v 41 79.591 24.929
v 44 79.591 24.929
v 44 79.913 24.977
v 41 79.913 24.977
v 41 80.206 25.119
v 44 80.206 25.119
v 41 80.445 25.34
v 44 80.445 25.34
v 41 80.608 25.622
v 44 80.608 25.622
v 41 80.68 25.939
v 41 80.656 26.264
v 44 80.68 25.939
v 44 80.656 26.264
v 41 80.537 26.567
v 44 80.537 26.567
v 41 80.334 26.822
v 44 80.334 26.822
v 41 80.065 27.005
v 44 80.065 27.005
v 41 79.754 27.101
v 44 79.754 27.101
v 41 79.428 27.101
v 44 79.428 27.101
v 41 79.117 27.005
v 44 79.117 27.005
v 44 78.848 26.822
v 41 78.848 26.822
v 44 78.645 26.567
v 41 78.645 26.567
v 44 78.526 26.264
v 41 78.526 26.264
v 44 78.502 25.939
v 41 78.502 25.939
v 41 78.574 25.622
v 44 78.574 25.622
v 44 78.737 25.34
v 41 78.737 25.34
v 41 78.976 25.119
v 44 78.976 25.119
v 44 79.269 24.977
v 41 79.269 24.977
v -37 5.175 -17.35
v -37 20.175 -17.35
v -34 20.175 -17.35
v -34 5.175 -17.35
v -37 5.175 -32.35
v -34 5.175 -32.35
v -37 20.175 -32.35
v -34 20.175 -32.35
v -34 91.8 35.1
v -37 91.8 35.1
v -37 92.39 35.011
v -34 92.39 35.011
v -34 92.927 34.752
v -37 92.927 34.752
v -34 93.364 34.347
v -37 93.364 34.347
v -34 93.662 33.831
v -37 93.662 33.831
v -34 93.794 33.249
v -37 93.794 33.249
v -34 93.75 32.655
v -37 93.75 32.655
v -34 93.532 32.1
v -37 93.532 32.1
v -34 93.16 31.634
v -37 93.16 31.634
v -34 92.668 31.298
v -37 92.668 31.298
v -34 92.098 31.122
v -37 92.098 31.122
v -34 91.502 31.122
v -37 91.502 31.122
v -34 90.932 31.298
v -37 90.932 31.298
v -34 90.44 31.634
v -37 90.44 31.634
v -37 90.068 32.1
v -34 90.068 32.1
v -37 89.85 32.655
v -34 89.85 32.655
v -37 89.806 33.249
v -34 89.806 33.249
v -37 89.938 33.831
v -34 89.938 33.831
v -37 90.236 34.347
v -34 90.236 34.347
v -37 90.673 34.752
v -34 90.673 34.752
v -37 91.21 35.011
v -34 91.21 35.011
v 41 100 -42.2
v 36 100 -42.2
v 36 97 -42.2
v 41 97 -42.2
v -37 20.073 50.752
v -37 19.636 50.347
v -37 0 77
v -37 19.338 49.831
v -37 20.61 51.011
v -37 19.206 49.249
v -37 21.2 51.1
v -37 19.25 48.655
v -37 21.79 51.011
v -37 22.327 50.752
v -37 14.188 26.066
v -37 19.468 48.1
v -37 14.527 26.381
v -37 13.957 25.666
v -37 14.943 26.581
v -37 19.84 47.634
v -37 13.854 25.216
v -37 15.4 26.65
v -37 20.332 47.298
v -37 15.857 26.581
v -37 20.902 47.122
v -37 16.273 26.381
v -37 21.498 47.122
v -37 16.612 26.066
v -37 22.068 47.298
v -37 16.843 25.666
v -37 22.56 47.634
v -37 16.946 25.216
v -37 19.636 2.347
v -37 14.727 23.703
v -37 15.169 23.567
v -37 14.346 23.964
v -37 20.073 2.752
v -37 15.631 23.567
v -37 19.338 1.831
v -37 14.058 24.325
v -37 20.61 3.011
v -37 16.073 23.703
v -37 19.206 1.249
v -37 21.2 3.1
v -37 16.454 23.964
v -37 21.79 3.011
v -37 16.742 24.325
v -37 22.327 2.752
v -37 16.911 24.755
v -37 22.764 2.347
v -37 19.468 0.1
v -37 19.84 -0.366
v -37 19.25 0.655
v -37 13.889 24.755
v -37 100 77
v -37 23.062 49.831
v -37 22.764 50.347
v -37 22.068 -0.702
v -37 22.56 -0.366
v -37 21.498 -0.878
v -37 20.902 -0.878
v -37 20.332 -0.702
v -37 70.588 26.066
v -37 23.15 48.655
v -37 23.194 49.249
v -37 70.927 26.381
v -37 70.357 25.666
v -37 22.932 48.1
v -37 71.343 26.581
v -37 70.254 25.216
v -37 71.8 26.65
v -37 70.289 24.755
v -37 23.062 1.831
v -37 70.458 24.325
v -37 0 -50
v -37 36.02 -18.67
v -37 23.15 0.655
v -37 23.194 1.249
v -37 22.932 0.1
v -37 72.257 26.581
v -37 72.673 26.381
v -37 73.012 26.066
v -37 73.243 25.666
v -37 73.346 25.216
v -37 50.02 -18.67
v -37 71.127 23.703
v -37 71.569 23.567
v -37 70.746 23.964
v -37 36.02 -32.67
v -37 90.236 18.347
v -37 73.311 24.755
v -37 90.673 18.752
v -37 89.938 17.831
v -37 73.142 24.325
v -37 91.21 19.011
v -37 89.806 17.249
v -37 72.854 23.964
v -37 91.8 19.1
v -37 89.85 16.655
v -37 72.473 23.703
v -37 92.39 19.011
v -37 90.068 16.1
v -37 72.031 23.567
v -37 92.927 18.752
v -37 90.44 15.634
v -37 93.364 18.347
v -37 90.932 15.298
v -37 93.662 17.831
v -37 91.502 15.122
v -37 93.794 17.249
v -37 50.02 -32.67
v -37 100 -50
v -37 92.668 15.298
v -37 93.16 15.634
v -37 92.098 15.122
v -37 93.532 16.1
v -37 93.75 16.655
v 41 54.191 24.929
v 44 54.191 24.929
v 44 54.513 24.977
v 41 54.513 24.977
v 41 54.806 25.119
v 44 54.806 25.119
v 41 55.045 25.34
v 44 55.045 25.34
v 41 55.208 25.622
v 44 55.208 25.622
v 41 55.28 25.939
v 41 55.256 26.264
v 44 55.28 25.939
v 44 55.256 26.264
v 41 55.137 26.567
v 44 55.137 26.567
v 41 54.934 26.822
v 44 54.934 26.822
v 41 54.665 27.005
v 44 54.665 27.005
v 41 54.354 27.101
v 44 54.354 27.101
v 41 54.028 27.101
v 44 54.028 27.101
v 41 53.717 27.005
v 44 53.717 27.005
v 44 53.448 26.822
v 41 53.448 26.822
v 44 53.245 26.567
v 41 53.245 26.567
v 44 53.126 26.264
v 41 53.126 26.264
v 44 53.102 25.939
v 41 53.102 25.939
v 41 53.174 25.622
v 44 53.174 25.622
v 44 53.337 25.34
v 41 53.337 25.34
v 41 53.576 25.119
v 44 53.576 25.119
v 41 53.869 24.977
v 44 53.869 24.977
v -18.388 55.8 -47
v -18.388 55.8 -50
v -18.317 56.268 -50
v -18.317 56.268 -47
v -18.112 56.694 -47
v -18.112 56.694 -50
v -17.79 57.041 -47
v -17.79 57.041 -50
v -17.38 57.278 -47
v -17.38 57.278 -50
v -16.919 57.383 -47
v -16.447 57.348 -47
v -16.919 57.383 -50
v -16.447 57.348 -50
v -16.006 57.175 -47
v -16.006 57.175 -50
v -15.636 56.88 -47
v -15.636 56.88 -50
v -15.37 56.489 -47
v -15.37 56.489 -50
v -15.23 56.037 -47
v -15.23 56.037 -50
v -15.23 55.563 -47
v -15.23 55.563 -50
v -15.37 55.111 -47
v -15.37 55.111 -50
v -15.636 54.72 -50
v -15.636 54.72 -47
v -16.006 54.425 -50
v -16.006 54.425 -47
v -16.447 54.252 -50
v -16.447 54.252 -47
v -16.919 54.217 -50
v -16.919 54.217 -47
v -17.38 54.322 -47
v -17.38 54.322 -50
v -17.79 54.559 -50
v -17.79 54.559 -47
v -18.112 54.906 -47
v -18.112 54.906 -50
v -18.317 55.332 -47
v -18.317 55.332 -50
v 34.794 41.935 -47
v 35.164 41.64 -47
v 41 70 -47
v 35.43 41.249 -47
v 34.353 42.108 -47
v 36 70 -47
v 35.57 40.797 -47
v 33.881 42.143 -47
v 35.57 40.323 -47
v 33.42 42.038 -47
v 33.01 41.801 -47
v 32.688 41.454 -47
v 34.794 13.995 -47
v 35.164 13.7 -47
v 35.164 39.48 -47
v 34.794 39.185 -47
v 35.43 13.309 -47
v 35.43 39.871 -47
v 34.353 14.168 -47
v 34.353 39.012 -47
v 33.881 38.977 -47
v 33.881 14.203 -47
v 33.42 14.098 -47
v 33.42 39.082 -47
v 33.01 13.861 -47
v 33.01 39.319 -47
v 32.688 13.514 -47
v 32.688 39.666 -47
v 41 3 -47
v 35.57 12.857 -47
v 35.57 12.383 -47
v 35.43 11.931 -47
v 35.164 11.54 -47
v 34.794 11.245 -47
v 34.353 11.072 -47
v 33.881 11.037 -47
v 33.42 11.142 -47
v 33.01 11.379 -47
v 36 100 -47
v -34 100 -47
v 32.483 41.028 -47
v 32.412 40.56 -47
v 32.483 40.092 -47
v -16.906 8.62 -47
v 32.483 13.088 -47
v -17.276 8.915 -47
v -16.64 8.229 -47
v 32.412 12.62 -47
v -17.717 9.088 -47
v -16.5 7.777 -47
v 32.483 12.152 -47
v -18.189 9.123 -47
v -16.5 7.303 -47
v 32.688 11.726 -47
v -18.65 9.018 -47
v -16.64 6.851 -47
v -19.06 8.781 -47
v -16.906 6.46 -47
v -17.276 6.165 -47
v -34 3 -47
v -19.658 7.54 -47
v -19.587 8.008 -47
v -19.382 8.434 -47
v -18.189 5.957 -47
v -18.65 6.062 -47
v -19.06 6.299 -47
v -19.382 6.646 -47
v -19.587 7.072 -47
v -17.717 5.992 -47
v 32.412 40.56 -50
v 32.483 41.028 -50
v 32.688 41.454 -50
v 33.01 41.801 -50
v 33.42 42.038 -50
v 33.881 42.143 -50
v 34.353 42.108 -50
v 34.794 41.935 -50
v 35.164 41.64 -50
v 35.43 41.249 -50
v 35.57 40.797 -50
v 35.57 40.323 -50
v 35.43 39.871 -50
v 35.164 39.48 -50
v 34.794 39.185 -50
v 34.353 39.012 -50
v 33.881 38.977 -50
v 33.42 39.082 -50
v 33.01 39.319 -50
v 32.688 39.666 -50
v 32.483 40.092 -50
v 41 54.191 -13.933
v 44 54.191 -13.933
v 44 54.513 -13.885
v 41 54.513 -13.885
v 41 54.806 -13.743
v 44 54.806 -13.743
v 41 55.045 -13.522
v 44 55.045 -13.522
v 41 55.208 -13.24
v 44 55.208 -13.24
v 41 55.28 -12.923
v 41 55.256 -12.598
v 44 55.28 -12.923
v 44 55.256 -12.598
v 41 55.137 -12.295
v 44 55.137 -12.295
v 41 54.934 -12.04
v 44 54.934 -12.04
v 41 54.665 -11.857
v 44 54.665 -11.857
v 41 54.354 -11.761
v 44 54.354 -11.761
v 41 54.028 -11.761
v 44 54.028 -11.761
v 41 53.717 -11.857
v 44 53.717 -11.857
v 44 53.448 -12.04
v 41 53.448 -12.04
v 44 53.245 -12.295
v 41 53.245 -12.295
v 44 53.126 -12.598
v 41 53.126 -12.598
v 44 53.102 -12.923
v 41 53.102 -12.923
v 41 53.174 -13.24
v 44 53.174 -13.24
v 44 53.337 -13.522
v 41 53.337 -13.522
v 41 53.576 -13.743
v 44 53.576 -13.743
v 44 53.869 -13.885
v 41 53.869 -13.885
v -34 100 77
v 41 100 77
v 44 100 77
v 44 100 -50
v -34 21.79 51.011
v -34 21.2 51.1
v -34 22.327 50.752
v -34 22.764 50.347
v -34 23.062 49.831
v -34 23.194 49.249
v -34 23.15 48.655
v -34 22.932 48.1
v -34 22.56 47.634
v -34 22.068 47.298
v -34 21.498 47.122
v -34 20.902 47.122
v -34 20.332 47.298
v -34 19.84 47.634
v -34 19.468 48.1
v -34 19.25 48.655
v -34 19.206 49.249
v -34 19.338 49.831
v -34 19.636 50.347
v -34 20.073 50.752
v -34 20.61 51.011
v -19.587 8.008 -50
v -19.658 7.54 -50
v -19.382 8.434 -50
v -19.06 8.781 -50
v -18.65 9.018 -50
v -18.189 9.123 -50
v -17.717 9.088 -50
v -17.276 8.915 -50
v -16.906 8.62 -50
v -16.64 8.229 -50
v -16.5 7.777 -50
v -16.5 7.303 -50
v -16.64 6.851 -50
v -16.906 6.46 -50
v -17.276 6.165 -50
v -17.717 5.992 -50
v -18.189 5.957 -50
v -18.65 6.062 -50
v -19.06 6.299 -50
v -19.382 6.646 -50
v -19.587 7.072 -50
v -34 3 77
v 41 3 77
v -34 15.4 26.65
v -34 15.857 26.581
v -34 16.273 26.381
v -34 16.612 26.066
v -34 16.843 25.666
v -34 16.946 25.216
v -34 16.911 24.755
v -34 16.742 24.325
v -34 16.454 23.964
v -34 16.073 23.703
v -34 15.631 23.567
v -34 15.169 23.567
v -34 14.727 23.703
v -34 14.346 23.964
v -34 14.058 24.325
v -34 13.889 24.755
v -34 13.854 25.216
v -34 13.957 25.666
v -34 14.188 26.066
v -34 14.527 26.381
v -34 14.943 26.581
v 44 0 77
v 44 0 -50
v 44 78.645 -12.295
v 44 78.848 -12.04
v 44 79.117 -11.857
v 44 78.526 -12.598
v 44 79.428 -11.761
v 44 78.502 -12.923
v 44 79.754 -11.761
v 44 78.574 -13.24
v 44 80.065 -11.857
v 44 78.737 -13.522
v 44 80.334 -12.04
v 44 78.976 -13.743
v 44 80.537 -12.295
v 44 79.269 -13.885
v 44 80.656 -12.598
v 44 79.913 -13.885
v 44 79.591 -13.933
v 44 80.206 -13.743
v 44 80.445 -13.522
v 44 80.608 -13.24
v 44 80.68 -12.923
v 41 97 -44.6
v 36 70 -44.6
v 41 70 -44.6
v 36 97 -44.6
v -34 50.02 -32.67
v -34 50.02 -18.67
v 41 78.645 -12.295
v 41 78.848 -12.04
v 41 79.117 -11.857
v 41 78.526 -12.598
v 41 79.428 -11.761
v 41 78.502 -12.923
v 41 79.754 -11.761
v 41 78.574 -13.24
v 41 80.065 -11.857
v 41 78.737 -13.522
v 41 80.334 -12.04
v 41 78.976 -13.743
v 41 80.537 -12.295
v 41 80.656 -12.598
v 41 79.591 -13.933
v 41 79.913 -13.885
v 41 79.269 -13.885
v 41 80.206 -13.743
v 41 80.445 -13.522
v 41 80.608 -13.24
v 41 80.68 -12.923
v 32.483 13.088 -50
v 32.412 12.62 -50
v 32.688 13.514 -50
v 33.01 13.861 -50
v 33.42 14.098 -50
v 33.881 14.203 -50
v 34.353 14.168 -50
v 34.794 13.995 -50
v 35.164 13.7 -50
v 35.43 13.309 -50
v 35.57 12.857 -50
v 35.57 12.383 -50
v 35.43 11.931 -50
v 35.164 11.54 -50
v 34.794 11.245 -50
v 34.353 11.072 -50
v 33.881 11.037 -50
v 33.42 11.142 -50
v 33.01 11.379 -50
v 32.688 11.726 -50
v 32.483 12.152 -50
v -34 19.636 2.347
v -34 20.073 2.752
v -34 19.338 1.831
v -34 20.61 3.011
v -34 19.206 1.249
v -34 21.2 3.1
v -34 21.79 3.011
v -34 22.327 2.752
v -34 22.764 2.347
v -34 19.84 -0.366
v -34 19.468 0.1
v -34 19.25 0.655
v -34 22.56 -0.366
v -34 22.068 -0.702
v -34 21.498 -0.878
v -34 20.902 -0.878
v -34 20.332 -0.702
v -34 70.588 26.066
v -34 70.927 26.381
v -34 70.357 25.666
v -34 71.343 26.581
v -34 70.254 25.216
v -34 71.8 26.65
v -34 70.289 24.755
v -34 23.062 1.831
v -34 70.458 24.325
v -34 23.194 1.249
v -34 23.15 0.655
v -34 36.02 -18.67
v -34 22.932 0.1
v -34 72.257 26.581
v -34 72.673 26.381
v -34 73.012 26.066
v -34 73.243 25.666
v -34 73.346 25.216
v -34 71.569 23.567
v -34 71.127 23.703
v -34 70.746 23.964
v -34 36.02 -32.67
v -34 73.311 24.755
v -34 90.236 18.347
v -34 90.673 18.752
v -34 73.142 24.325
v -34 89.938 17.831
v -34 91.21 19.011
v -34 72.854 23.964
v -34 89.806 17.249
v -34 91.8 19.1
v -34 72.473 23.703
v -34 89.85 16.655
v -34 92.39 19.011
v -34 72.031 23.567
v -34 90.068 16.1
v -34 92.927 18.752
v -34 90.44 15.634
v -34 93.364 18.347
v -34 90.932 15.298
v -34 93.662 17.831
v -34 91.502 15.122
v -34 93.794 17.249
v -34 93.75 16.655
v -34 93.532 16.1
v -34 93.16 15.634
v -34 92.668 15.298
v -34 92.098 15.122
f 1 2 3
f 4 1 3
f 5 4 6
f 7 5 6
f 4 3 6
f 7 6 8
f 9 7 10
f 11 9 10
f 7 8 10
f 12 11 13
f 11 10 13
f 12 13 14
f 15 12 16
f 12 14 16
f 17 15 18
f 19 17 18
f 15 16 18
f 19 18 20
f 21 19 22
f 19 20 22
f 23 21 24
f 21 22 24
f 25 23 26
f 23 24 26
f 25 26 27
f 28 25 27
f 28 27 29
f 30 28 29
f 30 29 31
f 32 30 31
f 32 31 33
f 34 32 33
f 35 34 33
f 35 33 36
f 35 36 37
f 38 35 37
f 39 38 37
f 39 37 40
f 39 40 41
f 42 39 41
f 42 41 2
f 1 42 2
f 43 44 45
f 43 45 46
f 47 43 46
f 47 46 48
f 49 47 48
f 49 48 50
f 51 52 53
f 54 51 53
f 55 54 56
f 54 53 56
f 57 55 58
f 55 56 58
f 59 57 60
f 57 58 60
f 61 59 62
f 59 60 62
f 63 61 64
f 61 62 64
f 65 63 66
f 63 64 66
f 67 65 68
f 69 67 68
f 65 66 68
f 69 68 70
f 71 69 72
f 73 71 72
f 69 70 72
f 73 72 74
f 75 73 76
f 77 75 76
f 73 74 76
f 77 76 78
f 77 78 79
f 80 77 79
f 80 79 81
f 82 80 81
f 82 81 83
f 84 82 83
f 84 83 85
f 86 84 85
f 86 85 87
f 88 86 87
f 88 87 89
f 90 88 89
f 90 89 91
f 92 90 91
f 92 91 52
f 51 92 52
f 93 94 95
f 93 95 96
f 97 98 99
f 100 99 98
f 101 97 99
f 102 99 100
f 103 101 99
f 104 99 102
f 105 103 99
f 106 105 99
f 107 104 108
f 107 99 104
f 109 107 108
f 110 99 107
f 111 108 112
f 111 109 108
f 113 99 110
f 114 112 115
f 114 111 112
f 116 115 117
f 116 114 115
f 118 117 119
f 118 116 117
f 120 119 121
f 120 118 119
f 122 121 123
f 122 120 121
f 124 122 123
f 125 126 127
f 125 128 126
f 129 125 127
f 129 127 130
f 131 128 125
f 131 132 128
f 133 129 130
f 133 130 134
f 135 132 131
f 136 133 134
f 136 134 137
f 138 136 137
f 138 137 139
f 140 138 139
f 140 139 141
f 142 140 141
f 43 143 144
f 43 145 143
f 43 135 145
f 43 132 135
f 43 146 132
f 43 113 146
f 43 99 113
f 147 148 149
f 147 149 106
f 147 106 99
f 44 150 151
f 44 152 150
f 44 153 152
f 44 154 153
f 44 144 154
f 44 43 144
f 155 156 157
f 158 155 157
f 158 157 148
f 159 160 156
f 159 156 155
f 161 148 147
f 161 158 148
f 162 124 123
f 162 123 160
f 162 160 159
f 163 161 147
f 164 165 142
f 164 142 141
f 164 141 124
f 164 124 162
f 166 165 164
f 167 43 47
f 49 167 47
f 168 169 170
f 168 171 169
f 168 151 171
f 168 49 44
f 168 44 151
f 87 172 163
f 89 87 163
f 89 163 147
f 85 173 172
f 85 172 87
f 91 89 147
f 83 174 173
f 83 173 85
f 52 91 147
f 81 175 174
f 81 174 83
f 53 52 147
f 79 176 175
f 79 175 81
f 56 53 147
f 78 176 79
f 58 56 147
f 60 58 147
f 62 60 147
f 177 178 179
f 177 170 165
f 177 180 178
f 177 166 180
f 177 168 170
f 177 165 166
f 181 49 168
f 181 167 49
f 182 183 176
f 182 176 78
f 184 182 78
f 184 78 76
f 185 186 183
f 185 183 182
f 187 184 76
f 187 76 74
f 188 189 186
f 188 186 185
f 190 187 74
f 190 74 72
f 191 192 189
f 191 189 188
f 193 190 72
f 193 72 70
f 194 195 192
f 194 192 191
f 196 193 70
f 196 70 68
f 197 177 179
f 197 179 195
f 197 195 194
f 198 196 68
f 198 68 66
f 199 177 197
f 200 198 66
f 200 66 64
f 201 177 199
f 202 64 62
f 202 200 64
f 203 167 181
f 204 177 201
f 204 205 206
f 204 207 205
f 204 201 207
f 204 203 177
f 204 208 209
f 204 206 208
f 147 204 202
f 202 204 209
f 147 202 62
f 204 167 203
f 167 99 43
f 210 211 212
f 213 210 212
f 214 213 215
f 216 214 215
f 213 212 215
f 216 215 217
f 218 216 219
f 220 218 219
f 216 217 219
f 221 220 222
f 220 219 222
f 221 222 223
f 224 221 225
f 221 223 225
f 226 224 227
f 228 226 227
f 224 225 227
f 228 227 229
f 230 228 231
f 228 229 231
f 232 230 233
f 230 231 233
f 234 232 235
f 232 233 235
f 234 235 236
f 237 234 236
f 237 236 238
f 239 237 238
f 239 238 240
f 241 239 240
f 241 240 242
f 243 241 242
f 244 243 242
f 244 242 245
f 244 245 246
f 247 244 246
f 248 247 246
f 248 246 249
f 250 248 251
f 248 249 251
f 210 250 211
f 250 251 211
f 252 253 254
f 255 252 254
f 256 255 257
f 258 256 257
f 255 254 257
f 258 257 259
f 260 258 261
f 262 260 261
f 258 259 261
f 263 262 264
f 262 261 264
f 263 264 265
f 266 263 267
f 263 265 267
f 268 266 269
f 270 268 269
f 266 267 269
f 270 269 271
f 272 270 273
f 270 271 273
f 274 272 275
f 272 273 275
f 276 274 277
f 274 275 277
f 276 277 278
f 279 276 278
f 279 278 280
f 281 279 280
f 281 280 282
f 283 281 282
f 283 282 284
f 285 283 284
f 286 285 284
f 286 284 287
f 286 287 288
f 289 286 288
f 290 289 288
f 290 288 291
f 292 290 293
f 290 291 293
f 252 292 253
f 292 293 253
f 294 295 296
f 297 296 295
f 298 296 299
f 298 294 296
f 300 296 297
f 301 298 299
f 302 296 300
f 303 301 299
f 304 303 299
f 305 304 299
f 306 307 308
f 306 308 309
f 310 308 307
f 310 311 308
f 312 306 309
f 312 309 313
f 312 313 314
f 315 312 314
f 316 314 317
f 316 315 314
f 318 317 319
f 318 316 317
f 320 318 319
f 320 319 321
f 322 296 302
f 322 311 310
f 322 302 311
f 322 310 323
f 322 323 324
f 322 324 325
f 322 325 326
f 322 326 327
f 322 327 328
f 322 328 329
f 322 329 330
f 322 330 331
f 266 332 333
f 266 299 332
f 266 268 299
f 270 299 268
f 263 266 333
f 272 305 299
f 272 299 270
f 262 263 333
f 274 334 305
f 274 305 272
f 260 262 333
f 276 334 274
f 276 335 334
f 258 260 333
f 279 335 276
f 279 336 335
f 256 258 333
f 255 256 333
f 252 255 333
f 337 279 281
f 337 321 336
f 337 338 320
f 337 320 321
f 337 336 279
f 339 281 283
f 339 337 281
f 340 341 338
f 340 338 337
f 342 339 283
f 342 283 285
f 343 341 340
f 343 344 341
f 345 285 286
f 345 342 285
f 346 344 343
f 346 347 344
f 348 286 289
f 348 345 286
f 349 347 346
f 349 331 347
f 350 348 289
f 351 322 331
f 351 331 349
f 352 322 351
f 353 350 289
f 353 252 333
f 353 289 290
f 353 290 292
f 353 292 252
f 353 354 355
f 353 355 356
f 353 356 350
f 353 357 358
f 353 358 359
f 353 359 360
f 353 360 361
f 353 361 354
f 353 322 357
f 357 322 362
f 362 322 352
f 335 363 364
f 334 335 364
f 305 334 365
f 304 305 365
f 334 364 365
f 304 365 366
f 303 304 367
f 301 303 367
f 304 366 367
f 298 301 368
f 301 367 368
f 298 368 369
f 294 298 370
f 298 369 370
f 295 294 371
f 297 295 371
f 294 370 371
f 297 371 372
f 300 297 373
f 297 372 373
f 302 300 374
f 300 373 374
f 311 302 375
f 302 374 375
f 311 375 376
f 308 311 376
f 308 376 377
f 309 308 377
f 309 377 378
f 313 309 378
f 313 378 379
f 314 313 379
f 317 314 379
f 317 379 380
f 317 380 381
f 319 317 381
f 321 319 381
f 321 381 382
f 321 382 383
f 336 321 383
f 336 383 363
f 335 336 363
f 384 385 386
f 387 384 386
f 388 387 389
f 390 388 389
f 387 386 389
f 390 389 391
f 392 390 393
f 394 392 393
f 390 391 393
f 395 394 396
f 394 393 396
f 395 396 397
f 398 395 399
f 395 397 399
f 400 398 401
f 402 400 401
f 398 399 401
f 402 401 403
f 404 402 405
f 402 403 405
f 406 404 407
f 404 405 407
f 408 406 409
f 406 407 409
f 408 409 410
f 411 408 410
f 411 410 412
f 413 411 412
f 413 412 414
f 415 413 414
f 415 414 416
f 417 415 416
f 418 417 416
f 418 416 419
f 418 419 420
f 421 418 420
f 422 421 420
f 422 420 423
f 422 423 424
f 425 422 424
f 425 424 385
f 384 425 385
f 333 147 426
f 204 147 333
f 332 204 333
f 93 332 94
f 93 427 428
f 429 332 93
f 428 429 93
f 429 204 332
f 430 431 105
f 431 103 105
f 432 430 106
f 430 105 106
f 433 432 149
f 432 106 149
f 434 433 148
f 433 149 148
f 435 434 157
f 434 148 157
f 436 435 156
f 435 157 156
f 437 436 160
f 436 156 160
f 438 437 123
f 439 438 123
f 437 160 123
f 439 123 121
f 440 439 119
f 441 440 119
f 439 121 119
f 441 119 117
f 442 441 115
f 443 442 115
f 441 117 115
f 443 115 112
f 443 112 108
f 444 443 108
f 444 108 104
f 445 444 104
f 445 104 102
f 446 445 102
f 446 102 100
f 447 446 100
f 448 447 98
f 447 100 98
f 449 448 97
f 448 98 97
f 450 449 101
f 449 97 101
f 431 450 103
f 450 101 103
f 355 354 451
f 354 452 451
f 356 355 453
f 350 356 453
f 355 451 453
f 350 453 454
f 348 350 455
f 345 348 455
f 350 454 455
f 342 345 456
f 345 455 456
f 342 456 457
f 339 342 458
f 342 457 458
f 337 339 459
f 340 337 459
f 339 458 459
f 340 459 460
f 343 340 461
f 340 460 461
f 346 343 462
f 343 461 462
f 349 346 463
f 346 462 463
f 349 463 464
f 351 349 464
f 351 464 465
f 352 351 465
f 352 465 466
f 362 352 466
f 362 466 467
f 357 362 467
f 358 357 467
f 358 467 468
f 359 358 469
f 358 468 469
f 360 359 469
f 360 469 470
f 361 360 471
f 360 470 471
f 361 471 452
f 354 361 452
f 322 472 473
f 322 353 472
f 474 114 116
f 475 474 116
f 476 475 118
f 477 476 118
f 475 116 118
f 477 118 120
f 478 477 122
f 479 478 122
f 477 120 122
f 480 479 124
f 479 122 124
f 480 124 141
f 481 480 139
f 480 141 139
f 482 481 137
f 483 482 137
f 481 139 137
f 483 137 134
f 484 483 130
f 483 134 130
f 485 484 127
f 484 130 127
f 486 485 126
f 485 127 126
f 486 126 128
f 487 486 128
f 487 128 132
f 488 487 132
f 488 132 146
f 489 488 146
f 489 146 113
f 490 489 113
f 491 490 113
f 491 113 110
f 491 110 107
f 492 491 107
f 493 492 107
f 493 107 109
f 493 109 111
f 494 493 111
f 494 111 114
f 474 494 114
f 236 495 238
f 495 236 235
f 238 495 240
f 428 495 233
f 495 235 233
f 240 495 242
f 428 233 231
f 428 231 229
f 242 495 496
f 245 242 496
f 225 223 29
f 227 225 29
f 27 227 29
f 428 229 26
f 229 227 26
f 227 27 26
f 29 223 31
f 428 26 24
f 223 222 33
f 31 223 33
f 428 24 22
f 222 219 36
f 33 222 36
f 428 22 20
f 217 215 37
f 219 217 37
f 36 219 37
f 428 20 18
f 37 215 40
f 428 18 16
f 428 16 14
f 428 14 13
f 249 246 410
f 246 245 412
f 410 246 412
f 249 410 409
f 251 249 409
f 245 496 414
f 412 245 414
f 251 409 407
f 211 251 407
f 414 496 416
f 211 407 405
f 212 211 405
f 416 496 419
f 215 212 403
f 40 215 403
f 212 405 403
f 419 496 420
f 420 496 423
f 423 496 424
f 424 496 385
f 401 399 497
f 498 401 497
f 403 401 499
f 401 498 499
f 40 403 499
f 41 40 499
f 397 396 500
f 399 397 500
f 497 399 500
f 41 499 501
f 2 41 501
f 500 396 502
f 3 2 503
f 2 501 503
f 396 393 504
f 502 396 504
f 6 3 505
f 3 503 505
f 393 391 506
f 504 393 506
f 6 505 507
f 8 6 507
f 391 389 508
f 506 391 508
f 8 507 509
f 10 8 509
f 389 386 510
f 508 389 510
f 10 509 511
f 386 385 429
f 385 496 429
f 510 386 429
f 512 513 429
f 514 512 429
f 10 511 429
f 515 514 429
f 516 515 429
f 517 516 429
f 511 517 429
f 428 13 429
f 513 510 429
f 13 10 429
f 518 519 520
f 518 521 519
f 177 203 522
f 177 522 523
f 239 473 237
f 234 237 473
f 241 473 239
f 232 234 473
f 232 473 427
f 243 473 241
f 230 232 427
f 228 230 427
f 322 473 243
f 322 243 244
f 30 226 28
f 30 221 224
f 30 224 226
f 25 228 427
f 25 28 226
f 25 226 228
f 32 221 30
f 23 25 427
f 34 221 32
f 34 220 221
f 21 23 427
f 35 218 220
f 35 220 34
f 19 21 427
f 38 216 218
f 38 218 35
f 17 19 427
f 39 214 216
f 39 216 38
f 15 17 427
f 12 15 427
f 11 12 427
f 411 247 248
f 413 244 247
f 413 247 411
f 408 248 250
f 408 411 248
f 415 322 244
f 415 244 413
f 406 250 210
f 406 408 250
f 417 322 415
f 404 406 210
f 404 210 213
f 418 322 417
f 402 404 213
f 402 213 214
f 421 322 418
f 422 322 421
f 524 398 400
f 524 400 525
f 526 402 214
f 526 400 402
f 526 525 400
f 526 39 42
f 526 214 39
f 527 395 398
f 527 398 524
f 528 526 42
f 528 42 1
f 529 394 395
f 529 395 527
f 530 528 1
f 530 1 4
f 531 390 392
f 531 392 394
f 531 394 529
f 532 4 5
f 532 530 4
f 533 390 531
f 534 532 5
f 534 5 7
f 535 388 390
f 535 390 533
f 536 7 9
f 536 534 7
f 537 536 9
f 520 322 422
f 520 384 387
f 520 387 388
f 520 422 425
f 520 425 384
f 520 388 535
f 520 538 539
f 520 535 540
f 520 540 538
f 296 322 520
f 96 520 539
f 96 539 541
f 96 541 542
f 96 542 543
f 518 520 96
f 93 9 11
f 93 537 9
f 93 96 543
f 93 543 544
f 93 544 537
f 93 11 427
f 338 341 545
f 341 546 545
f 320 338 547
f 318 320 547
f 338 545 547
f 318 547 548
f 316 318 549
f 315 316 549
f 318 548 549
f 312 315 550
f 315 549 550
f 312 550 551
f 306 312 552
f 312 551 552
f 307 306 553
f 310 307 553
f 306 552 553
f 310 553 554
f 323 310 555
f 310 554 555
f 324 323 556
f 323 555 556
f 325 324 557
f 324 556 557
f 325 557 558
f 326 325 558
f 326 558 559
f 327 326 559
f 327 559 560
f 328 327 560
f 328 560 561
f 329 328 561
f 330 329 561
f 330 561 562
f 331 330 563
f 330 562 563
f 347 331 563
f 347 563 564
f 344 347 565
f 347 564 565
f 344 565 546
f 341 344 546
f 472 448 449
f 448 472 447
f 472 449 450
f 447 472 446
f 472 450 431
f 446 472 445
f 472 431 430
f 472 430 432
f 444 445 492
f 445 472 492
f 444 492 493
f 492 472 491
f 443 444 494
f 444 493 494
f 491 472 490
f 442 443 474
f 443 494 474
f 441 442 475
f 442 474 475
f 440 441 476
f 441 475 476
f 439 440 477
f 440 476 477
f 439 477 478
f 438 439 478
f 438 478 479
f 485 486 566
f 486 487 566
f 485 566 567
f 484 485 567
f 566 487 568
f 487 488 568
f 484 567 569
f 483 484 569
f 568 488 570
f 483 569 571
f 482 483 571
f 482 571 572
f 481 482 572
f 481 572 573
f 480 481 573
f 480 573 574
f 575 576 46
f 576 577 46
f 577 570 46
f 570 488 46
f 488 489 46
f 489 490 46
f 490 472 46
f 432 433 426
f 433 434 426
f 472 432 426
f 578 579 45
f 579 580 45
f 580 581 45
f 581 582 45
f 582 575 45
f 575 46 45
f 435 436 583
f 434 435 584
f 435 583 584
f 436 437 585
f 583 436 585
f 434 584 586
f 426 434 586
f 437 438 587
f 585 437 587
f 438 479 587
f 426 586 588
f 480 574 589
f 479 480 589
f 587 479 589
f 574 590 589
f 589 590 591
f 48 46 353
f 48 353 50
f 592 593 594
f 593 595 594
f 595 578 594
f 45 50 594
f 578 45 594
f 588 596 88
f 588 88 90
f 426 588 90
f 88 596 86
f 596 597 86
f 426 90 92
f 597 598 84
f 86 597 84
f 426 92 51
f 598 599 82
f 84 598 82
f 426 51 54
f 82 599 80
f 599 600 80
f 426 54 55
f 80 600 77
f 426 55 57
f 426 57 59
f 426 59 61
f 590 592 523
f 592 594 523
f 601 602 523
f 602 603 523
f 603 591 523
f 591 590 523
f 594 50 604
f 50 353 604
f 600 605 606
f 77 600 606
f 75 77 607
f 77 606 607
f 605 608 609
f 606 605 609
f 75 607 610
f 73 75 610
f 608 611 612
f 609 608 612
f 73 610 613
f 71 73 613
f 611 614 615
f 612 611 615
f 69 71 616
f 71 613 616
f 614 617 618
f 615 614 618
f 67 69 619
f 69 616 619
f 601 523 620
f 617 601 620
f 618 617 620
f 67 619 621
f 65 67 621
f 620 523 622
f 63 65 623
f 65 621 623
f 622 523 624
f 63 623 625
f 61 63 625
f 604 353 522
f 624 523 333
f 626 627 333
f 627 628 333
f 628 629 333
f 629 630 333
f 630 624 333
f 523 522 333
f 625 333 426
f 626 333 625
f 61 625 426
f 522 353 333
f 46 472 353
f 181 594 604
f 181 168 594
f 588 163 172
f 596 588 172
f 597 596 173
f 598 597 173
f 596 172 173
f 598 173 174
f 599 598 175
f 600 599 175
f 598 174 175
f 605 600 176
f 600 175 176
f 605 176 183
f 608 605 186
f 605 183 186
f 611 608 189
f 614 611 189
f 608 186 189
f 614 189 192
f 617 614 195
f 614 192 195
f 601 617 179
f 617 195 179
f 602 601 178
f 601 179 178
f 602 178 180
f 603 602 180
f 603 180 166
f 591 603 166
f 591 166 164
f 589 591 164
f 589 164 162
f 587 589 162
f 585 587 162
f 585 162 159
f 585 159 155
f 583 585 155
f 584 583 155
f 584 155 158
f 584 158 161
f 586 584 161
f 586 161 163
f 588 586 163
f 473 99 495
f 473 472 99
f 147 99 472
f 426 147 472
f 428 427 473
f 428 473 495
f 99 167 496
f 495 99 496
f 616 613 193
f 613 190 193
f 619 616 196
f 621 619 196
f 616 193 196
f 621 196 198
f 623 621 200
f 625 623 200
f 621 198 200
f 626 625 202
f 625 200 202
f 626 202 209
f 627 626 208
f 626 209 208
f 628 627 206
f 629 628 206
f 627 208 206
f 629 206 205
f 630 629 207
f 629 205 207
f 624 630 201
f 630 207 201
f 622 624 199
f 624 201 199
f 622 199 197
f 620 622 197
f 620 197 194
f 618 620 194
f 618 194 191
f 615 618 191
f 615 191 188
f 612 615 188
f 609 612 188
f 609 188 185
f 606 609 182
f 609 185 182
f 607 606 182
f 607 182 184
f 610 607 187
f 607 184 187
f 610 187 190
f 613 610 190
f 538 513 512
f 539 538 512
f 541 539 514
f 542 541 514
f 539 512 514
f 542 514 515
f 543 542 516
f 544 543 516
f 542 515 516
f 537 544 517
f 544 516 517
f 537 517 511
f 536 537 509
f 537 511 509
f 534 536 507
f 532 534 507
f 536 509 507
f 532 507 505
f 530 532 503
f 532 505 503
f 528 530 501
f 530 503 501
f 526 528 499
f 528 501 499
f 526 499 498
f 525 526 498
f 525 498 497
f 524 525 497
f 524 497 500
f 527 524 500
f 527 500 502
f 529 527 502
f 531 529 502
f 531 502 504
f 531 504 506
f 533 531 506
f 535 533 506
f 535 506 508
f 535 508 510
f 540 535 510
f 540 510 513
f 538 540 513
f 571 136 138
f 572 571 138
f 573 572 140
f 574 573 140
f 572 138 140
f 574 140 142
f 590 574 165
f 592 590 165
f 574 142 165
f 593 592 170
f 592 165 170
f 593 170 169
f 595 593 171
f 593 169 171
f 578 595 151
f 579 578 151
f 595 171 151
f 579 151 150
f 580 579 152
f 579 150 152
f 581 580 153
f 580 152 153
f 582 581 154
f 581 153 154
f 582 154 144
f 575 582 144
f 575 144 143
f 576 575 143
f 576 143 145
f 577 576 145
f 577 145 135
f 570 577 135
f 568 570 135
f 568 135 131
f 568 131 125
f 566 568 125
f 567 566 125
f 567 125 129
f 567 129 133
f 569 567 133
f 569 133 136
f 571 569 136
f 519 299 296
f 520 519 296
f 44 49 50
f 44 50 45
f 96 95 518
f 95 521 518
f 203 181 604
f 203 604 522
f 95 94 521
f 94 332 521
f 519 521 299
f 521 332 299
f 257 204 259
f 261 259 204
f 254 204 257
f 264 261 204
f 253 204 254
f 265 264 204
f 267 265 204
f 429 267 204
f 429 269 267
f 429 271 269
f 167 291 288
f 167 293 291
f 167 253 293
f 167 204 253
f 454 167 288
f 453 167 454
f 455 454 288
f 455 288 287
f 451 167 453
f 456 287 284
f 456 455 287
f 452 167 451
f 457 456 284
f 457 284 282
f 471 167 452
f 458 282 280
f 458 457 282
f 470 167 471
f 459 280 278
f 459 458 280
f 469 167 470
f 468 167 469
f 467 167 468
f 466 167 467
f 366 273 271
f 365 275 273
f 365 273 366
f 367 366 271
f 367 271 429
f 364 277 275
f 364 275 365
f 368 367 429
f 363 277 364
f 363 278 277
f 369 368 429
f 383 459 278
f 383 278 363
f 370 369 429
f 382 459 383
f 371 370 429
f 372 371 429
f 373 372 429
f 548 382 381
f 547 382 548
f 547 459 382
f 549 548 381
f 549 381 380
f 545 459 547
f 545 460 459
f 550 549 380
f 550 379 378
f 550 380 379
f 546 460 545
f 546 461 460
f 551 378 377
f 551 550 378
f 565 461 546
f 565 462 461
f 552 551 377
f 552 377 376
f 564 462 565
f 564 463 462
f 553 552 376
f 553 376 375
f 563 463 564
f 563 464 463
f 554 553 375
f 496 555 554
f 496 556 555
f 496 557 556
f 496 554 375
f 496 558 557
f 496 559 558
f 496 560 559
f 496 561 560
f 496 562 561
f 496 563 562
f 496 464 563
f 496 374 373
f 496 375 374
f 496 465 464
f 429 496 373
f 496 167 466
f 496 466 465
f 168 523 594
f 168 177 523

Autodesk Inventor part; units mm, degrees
ref_plane "YZ Plane" through (0, 0, 0) normal (1, 0, 0) x (0, 1, 0)
ref_plane "XZ Plane" through (0, 0, 0) normal (0, 1, 0) x (-1, 0, 0)
ref_plane "XY Plane" through (0, 0, 0) normal (0, 0, 1) x (1, 0, 0)
sketch "Sketch3" plane through (0, 0, 0) normal (0, 1, 0) x (-1, 0, 0)
  line L0 (-44, 50) -> (44, 50)
  line L1 (44, 50) -> (44, -50)
  line L2 (44, -50) -> (-44, -50)
  line L3 (-44, -50) -> (-44, 50)
  line L4 (-44, 50) -> (44, -50) construction
  line L5 (44, 50) -> (-44, -50) construction
  line L6 (44, 50) -> (-44, 50)
  line L7 (-44, 50) -> (-44, 47)
  line L8 (-44, 47) -> (44, 47)
  line L9 (44, 47) -> (44, 50)
  line L10 (44, 47) -> (41, 47)
  line L11 (41, 47) -> (41, -50)
  line L12 (41, -50) -> (44, -50)
  line L13 (44, -50) -> (44, 47)
  line L14 (-44, 47) -> (-41, 47)
  line L15 (-41, 47) -> (-41, -50)
  line L16 (-41, -50) -> (-44, -50)
  line L17 (-44, -50) -> (-44, 47)
  line L18 (41, -50) -> (-41, -50)
  line L19 (-41, -50) -> (-41, -47)
  line L20 (-41, -47) -> (41, -47)
  line L21 (41, -47) -> (41, -50)
  line L22 (41, 47) -> (34, 47)
  line L23 (34, 47) -> (34, -50)
  line L24 (34, -50) -> (37, -50)
  line L25 (37, -50) -> (37, 50)
  line L26 (34, 47) -> (34, 50)
  line L27 (41, 47) -> (41, 50)
  line L28 (-41, 47) -> (-41, 50)
  point P0 (0, 0)
  point P1 (37, -47)
  point P2 (37, 47)
  point P3 (34, -47)
  point P4 (37, 50)
  dimension "d33" = 88
  dimension "d34" = 100
  dimension "d35" = 88
  dimension "d36" = 3
  dimension "d37" = 3
  dimension "d38" = 3
  dimension "d39" = 3
  dimension "d63" = 7
  dimension "d64" = 3
extrude "Extrusion2" add sketch "Sketch3" along normal blind 100 contours L8 L15 L2 L3 | L8 L25 L20 L23 | L20 L23 L2 L15 | L20 L25 L2 L23
sketch "Sketch6" plane through (44, 0, -50) normal (0, 0, -1) x (-1, 0, 0)
  circle A0 centre (62.07, 7.54) radius 1.5875
  circle A1 centre (10, 12.62) radius 1.5875
  circle A2 centre (10, 40.56) radius 1.5875
  line L0 (7.46, 10.08) -> (7.46, 42.846)
  line L1 (7.46, 42.846) -> (10, 45.386)
  line L2 (10, 45.386) -> (10, 58.34)
  line L3 (10, 7.54) -> (7.46, 10.08)
  line L4 (10, 5) -> (10, 7.54)
  line L5 (76.04, 5) -> (10, 5)
  line L6 (76.04, 58.34) -> (76.04, 5)
  line L7 (10, 58.34) -> (76.04, 58.34)
  circle A3 centre (60.8, 55.8) radius 1.5875
  line L8 (0, 0) -> (81, 0) projected
  line L9 (0, 100) -> (81, 100) projected
  line L10 (0, 0) -> (0, 100) projected
  line L11 (0, 0) -> (0, 100) projected
  line L12 (0, 0) -> (10, 0)
  line L13 (78, 0) -> (3, 0) projected
  line L14 (10, 0) -> (10, 5)
  line L15 (81, 0) -> (81, 100) projected
  point P0 (44, 0)
  point P1 (85, 0)
  dimension "d52" = 10
  dimension "d53" = 5
  dimension "d54" = 90
extrude "Extrusion4" cut sketch "Sketch6" against normal up to surface (3 mm away) contours A0 | A1 | A2 | A3
sketch "Sketch9" plane through (-37, 0, -50) normal (-1, 0, 0) x (0, 0, 1)
  line L0 (17.33, 50.02) -> (31.33, 50.02) projected
  line L1 (31.33, 50.02) -> (31.33, 36.02) projected
  line L2 (31.33, 36.02) -> (17.33, 36.02) projected
  line L3 (17.33, 36.02) -> (17.33, 50.02) projected
  line L4 (17.65, 20.175) -> (32.65, 20.175) projected
  line L5 (32.65, 20.175) -> (32.65, 5.175) projected
  line L6 (32.65, 5.175) -> (17.65, 5.175) projected
  line L7 (17.65, 5.175) -> (17.65, 20.175) projected
  point P0 (50, 0)
extrude "Extrusion6" cut sketch "Sketch9" against normal up to surface (3 mm away)
sketch "Sketch10" plane through (44, 0, 50) normal (1, 0, 0) x (0, 0, -1)
  circle A0 centre (23.979, 79.591) radius 1.0922
  circle A1 centre (62.841, 79.591) radius 1.0922
  circle A2 centre (62.841, 54.191) radius 1.0922
  line L0 (21.82, 50) -> (21.82, 81.75)
  line L1 (65, 50) -> (21.82, 50)
  line L2 (65, 81.75) -> (65, 50)
  line L3 (21.82, 81.75) -> (65, 81.75)
  circle A3 centre (23.979, 54.191) radius 1.0922
  line L4 (3, 0) -> (100, 0) projected
  line L5 (100, 0) -> (100, 100) projected
  line L6 (3, 100) -> (100, 100) projected
  line L7 (100, 0) -> (100, 100) projected
  line L8 (100, 100) -> (65, 100)
  line L9 (3, 100) -> (100, 100) projected
  line L10 (100, 100) -> (135, 100) construction
  line L11 (100, 0) -> (100, 100) projected
  line L12 (65, 100) -> (65, 0)
  line L13 (100, 0) -> (3, 0) projected
  line L14 (3, 0) -> (3, 100) projected
  point P0 (50, 0)
  point P1 (0, 0)
  point P2 (0, 100)
  dimension "d67" = 35
  dimension "d68" = 180
  dimension "d75" = 100
extrude "Extrusion7" cut sketch "Sketch10" against normal up to surface (3 mm away) contours A0 | A1 | A2 | A3
sketch "Sketch11" plane through (-37, 0, -50) normal (-1, 0, 0) x (0, 0, 1)
  circle A0 centre (75.1, 71.8) radius 1.55
  circle A1 centre (75.1, 15.4) radius 1.55
  line L0 (67.45, 5) -> (82.75, 5)
  line L1 (67.45, 82.2) -> (82.75, 82.2)
  line L2 (95, 82.2) -> (95, 5)
  line L3 (55.2, 82.2) -> (55.2, 5)
  line L4 (32.65, 5.175) -> (17.65, 5.175) projected
  line L5 (17.65, 5.175) -> (17.65, 20.175) projected
  line L6 (17.65, 20.175) -> (32.65, 20.175) projected
  line L7 (32.65, 20.175) -> (32.65, 5.175) projected
  line L8 (31.33, 50.02) -> (31.33, 36.02) projected
  line L9 (31.33, 36.02) -> (17.33, 36.02) projected
  line L10 (17.33, 36.02) -> (17.33, 50.02) projected
  line L11 (17.33, 50.02) -> (31.33, 50.02) projected
  line L12 (0, 0) -> (97, 0) projected
  line L13 (0, 100) -> (97, 100) projected
  line L14 (0, 0) -> (0, 100) projected
  line L15 (100, 0) -> (100, 100) projected
  line L16 (100, 0) -> (100, 5)
  line L17 (100, 5) -> (95, 5)
  line L18 (97, 0) -> (97, 100) projected
  point P0 (50, 0)
  dimension "d71" = 5
  dimension "d72" = 5
extrude "Extrusion8" cut sketch "Sketch11" against normal up to surface (3 mm away) contours A0 | A1
sketch "Sketch12" plane through (-34, 0, -47) normal (0, 0, 1) x (1, 0, 0)
  circle A0 centre (17.2, 55.8) radius 1.5875 projected
  circle A1 centre (68, 40.56) radius 1.5875 projected
  circle A2 centre (15.93, 7.54) radius 1.5875 projected
  circle A3 centre (68, 12.62) radius 1.5875 projected
  line L0 (0, 0) -> (75, 0) projected
  line L1 (75, 0) -> (75, 100) projected
  line L2 (0, 100) -> (75, 100) projected
  line L3 (0, 0) -> (0, 100) projected
  line L4 (75, 0) -> (75, 100) projected
  line L5 (75, 100) -> (70, 100)
  line L6 (70, 100) -> (70, 70)
  line L7 (70, 70) -> (75, 70)
  line L8 (75, 70) -> (75, 100)
  point P0 (34, 0)
  dimension "d76" = 5
  dimension "d77" = 30
extrude "Extrusion9" add sketch "Sketch12" along normal blind 2.4 contours L7 L6 L2 L1
sketch "Sketch13" plane through (-34, 0, -44.6) normal (0, 0, 1) x (1, 0, 0)
  line L0 (70, 100) -> (70, 70) projected
  line L1 (70, 70) -> (75, 70) projected
  line L2 (75, 100) -> (75, 70) projected
  line L3 (75, 100) -> (70, 100) projected
  line L4 (70, 100) -> (70, 70) projected
  line L5 (75, 100) -> (70, 100)
  line L6 (70, 100) -> (70, 97)
  line L7 (70, 97) -> (75, 97)
  line L8 (75, 97) -> (75, 100)
  point P0 (34, 0)
  dimension "d80" = 3
extrude "Extrusion10" add sketch "Sketch13" along normal blind 2.4 contours L3 L2 L7 L0
sketch "Sketch14" plane through (-34, 0, -47) normal (0, 0, 1) x (1, 0, 0)
  line L0 (75, 0) -> (75, 70) projected
  line L1 (0, 0) -> (0, 100) projected
  line L2 (75, 0) -> (0, 0)
  line L3 (0, 0) -> (0, 3)
  line L4 (0, 3) -> (75, 3)
  line L5 (75, 3) -> (75, 0)
  point P0 (34, 0)
  dimension "d83" = 3
extrude "Extrusion11" add sketch "Sketch14" along normal up to surface (94 mm away)
sketch "Sketch15" plane through (-37, 0, 47) normal (0, 0, 1) x (1, 0, 0)
  line L0 (0, 0) -> (81, 0) projected
  line L1 (81, 0) -> (81, 100) projected
  line L2 (78, 100) -> (81, 100) projected
  line L3 (78, 3) -> (78, 100) projected
  line L4 (3, 3) -> (78, 3) projected
  line L5 (3, 3) -> (3, 100) projected
  line L6 (0, 100) -> (3, 100) projected
  line L7 (0, 0) -> (0, 100) projected
  point P0 (37, 0)
extrude "Extrusion12" add sketch "Sketch15" along normal blind 30
sketch "Sketch16" plane through (-37, 0, -50) normal (-1, 0, 0) x (0, 0, 1)
  circle A0 centre (75.1, 15.4) radius 1.55 projected
  circle A1 centre (75.1, 71.8) radius 1.55 projected
  line L0 (17.65, 5.175) -> (17.65, 20.175) projected
  line L1 (17.65, 20.175) -> (32.65, 20.175) projected
  line L2 (32.65, 20.175) -> (32.65, 5.175) projected
  line L3 (32.65, 5.175) -> (17.65, 5.175) projected
  line L4 (17.33, 50.02) -> (31.33, 50.02) projected
  line L5 (31.33, 50.02) -> (31.33, 36.02) projected
  line L6 (31.33, 36.02) -> (17.33, 36.02) projected
  line L7 (17.33, 36.02) -> (17.33, 50.02) projected
  line L8 (0, 0) -> (127, 0) projected
  line L9 (127, 100) -> (127, 0) projected
  line L10 (0, 100) -> (127, 100) projected
  line L11 (0, 0) -> (0, 100) projected
  circle A2 centre (75.1, 71.8) radius 1.55 projected
  line L12 (75.1, 71.8) -> (75.1, 91.8)
  line L13 (75.1, 91.8) -> (83.1, 91.8)
  line L14 (75.1, 91.8) -> (67.1, 91.8)
  circle A3 centre (83.1, 91.8) radius 2
  circle A4 centre (67.1, 91.8) radius 2
  line L15 (127, 3) -> (127, 100) projected
  line L16 (127, 51.5) -> (71.1, 51.5)
  line L17 (75.1, 11.2) -> (83.1, 11.2)
  line L18 (75.1, 11.2) -> (67.1, 11.2)
  circle A5 centre (83.1, 11.2) radius 2
  circle A6 centre (67.1, 11.2) radius 2
  line L19 (83.1, 11.2) -> (91.1, 11.2)
  line L20 (67.1, 11.2) -> (59.1, 11.2)
  line L21 (127, 3) -> (3, 3) projected
  circle A7 centre (59.1, 11.2) radius 2
  circle A8 centre (91.1, 11.2) radius 2
  line L22 (91.1, 11.2) -> (99.1, 11.2)
  line L23 (99.1, 11.2) -> (99.1, 21.2)
  line L24 (99.1, 21.2) -> (51.1, 21.2)
  circle A9 centre (99.1, 21.2) radius 2
  circle A10 centre (51.1, 21.2) radius 2
  point P0 (50, 0)
  dimension "d88" = 20
  dimension "d89" = 8
  dimension "d90" = 8
  dimension "d91" = 4
  dimension "d92" = 4
  dimension "d95" = 8
  dimension "d96" = 8
  dimension "d97" = 4
  dimension "d98" = 4
  dimension "d99" = 8
  dimension "d100" = 10
  dimension "d101" = 48
  dimension "d102" = 4
  dimension "d103" = 4
extrude "Extrusion13" cut sketch "Sketch16" against normal up to surface (3 mm away) contours A4 | A3 | A10 | A9 L24 L23 | L23 L24 A9
equation "\"BendRadius\" = Thickness"
equation "\"BendReliefWidth\" = Thickness"
equation "\"BendReliefDepth\" = 0.5 * Thickness"
equation "\"CornerReliefSize\" = 4 * Thickness"
equation "\"MinimumRemnant\" = 2 * Thickness"
equation "\"TransitionRadius\" = BendRadius"
equation "\"JacobiRadiusSize\" = Thickness"
equation "\"GapSize\" = Thickness"
equation "\"Thickness\" = 3"
properties part number "obudowa" material "ABS Plastic"
